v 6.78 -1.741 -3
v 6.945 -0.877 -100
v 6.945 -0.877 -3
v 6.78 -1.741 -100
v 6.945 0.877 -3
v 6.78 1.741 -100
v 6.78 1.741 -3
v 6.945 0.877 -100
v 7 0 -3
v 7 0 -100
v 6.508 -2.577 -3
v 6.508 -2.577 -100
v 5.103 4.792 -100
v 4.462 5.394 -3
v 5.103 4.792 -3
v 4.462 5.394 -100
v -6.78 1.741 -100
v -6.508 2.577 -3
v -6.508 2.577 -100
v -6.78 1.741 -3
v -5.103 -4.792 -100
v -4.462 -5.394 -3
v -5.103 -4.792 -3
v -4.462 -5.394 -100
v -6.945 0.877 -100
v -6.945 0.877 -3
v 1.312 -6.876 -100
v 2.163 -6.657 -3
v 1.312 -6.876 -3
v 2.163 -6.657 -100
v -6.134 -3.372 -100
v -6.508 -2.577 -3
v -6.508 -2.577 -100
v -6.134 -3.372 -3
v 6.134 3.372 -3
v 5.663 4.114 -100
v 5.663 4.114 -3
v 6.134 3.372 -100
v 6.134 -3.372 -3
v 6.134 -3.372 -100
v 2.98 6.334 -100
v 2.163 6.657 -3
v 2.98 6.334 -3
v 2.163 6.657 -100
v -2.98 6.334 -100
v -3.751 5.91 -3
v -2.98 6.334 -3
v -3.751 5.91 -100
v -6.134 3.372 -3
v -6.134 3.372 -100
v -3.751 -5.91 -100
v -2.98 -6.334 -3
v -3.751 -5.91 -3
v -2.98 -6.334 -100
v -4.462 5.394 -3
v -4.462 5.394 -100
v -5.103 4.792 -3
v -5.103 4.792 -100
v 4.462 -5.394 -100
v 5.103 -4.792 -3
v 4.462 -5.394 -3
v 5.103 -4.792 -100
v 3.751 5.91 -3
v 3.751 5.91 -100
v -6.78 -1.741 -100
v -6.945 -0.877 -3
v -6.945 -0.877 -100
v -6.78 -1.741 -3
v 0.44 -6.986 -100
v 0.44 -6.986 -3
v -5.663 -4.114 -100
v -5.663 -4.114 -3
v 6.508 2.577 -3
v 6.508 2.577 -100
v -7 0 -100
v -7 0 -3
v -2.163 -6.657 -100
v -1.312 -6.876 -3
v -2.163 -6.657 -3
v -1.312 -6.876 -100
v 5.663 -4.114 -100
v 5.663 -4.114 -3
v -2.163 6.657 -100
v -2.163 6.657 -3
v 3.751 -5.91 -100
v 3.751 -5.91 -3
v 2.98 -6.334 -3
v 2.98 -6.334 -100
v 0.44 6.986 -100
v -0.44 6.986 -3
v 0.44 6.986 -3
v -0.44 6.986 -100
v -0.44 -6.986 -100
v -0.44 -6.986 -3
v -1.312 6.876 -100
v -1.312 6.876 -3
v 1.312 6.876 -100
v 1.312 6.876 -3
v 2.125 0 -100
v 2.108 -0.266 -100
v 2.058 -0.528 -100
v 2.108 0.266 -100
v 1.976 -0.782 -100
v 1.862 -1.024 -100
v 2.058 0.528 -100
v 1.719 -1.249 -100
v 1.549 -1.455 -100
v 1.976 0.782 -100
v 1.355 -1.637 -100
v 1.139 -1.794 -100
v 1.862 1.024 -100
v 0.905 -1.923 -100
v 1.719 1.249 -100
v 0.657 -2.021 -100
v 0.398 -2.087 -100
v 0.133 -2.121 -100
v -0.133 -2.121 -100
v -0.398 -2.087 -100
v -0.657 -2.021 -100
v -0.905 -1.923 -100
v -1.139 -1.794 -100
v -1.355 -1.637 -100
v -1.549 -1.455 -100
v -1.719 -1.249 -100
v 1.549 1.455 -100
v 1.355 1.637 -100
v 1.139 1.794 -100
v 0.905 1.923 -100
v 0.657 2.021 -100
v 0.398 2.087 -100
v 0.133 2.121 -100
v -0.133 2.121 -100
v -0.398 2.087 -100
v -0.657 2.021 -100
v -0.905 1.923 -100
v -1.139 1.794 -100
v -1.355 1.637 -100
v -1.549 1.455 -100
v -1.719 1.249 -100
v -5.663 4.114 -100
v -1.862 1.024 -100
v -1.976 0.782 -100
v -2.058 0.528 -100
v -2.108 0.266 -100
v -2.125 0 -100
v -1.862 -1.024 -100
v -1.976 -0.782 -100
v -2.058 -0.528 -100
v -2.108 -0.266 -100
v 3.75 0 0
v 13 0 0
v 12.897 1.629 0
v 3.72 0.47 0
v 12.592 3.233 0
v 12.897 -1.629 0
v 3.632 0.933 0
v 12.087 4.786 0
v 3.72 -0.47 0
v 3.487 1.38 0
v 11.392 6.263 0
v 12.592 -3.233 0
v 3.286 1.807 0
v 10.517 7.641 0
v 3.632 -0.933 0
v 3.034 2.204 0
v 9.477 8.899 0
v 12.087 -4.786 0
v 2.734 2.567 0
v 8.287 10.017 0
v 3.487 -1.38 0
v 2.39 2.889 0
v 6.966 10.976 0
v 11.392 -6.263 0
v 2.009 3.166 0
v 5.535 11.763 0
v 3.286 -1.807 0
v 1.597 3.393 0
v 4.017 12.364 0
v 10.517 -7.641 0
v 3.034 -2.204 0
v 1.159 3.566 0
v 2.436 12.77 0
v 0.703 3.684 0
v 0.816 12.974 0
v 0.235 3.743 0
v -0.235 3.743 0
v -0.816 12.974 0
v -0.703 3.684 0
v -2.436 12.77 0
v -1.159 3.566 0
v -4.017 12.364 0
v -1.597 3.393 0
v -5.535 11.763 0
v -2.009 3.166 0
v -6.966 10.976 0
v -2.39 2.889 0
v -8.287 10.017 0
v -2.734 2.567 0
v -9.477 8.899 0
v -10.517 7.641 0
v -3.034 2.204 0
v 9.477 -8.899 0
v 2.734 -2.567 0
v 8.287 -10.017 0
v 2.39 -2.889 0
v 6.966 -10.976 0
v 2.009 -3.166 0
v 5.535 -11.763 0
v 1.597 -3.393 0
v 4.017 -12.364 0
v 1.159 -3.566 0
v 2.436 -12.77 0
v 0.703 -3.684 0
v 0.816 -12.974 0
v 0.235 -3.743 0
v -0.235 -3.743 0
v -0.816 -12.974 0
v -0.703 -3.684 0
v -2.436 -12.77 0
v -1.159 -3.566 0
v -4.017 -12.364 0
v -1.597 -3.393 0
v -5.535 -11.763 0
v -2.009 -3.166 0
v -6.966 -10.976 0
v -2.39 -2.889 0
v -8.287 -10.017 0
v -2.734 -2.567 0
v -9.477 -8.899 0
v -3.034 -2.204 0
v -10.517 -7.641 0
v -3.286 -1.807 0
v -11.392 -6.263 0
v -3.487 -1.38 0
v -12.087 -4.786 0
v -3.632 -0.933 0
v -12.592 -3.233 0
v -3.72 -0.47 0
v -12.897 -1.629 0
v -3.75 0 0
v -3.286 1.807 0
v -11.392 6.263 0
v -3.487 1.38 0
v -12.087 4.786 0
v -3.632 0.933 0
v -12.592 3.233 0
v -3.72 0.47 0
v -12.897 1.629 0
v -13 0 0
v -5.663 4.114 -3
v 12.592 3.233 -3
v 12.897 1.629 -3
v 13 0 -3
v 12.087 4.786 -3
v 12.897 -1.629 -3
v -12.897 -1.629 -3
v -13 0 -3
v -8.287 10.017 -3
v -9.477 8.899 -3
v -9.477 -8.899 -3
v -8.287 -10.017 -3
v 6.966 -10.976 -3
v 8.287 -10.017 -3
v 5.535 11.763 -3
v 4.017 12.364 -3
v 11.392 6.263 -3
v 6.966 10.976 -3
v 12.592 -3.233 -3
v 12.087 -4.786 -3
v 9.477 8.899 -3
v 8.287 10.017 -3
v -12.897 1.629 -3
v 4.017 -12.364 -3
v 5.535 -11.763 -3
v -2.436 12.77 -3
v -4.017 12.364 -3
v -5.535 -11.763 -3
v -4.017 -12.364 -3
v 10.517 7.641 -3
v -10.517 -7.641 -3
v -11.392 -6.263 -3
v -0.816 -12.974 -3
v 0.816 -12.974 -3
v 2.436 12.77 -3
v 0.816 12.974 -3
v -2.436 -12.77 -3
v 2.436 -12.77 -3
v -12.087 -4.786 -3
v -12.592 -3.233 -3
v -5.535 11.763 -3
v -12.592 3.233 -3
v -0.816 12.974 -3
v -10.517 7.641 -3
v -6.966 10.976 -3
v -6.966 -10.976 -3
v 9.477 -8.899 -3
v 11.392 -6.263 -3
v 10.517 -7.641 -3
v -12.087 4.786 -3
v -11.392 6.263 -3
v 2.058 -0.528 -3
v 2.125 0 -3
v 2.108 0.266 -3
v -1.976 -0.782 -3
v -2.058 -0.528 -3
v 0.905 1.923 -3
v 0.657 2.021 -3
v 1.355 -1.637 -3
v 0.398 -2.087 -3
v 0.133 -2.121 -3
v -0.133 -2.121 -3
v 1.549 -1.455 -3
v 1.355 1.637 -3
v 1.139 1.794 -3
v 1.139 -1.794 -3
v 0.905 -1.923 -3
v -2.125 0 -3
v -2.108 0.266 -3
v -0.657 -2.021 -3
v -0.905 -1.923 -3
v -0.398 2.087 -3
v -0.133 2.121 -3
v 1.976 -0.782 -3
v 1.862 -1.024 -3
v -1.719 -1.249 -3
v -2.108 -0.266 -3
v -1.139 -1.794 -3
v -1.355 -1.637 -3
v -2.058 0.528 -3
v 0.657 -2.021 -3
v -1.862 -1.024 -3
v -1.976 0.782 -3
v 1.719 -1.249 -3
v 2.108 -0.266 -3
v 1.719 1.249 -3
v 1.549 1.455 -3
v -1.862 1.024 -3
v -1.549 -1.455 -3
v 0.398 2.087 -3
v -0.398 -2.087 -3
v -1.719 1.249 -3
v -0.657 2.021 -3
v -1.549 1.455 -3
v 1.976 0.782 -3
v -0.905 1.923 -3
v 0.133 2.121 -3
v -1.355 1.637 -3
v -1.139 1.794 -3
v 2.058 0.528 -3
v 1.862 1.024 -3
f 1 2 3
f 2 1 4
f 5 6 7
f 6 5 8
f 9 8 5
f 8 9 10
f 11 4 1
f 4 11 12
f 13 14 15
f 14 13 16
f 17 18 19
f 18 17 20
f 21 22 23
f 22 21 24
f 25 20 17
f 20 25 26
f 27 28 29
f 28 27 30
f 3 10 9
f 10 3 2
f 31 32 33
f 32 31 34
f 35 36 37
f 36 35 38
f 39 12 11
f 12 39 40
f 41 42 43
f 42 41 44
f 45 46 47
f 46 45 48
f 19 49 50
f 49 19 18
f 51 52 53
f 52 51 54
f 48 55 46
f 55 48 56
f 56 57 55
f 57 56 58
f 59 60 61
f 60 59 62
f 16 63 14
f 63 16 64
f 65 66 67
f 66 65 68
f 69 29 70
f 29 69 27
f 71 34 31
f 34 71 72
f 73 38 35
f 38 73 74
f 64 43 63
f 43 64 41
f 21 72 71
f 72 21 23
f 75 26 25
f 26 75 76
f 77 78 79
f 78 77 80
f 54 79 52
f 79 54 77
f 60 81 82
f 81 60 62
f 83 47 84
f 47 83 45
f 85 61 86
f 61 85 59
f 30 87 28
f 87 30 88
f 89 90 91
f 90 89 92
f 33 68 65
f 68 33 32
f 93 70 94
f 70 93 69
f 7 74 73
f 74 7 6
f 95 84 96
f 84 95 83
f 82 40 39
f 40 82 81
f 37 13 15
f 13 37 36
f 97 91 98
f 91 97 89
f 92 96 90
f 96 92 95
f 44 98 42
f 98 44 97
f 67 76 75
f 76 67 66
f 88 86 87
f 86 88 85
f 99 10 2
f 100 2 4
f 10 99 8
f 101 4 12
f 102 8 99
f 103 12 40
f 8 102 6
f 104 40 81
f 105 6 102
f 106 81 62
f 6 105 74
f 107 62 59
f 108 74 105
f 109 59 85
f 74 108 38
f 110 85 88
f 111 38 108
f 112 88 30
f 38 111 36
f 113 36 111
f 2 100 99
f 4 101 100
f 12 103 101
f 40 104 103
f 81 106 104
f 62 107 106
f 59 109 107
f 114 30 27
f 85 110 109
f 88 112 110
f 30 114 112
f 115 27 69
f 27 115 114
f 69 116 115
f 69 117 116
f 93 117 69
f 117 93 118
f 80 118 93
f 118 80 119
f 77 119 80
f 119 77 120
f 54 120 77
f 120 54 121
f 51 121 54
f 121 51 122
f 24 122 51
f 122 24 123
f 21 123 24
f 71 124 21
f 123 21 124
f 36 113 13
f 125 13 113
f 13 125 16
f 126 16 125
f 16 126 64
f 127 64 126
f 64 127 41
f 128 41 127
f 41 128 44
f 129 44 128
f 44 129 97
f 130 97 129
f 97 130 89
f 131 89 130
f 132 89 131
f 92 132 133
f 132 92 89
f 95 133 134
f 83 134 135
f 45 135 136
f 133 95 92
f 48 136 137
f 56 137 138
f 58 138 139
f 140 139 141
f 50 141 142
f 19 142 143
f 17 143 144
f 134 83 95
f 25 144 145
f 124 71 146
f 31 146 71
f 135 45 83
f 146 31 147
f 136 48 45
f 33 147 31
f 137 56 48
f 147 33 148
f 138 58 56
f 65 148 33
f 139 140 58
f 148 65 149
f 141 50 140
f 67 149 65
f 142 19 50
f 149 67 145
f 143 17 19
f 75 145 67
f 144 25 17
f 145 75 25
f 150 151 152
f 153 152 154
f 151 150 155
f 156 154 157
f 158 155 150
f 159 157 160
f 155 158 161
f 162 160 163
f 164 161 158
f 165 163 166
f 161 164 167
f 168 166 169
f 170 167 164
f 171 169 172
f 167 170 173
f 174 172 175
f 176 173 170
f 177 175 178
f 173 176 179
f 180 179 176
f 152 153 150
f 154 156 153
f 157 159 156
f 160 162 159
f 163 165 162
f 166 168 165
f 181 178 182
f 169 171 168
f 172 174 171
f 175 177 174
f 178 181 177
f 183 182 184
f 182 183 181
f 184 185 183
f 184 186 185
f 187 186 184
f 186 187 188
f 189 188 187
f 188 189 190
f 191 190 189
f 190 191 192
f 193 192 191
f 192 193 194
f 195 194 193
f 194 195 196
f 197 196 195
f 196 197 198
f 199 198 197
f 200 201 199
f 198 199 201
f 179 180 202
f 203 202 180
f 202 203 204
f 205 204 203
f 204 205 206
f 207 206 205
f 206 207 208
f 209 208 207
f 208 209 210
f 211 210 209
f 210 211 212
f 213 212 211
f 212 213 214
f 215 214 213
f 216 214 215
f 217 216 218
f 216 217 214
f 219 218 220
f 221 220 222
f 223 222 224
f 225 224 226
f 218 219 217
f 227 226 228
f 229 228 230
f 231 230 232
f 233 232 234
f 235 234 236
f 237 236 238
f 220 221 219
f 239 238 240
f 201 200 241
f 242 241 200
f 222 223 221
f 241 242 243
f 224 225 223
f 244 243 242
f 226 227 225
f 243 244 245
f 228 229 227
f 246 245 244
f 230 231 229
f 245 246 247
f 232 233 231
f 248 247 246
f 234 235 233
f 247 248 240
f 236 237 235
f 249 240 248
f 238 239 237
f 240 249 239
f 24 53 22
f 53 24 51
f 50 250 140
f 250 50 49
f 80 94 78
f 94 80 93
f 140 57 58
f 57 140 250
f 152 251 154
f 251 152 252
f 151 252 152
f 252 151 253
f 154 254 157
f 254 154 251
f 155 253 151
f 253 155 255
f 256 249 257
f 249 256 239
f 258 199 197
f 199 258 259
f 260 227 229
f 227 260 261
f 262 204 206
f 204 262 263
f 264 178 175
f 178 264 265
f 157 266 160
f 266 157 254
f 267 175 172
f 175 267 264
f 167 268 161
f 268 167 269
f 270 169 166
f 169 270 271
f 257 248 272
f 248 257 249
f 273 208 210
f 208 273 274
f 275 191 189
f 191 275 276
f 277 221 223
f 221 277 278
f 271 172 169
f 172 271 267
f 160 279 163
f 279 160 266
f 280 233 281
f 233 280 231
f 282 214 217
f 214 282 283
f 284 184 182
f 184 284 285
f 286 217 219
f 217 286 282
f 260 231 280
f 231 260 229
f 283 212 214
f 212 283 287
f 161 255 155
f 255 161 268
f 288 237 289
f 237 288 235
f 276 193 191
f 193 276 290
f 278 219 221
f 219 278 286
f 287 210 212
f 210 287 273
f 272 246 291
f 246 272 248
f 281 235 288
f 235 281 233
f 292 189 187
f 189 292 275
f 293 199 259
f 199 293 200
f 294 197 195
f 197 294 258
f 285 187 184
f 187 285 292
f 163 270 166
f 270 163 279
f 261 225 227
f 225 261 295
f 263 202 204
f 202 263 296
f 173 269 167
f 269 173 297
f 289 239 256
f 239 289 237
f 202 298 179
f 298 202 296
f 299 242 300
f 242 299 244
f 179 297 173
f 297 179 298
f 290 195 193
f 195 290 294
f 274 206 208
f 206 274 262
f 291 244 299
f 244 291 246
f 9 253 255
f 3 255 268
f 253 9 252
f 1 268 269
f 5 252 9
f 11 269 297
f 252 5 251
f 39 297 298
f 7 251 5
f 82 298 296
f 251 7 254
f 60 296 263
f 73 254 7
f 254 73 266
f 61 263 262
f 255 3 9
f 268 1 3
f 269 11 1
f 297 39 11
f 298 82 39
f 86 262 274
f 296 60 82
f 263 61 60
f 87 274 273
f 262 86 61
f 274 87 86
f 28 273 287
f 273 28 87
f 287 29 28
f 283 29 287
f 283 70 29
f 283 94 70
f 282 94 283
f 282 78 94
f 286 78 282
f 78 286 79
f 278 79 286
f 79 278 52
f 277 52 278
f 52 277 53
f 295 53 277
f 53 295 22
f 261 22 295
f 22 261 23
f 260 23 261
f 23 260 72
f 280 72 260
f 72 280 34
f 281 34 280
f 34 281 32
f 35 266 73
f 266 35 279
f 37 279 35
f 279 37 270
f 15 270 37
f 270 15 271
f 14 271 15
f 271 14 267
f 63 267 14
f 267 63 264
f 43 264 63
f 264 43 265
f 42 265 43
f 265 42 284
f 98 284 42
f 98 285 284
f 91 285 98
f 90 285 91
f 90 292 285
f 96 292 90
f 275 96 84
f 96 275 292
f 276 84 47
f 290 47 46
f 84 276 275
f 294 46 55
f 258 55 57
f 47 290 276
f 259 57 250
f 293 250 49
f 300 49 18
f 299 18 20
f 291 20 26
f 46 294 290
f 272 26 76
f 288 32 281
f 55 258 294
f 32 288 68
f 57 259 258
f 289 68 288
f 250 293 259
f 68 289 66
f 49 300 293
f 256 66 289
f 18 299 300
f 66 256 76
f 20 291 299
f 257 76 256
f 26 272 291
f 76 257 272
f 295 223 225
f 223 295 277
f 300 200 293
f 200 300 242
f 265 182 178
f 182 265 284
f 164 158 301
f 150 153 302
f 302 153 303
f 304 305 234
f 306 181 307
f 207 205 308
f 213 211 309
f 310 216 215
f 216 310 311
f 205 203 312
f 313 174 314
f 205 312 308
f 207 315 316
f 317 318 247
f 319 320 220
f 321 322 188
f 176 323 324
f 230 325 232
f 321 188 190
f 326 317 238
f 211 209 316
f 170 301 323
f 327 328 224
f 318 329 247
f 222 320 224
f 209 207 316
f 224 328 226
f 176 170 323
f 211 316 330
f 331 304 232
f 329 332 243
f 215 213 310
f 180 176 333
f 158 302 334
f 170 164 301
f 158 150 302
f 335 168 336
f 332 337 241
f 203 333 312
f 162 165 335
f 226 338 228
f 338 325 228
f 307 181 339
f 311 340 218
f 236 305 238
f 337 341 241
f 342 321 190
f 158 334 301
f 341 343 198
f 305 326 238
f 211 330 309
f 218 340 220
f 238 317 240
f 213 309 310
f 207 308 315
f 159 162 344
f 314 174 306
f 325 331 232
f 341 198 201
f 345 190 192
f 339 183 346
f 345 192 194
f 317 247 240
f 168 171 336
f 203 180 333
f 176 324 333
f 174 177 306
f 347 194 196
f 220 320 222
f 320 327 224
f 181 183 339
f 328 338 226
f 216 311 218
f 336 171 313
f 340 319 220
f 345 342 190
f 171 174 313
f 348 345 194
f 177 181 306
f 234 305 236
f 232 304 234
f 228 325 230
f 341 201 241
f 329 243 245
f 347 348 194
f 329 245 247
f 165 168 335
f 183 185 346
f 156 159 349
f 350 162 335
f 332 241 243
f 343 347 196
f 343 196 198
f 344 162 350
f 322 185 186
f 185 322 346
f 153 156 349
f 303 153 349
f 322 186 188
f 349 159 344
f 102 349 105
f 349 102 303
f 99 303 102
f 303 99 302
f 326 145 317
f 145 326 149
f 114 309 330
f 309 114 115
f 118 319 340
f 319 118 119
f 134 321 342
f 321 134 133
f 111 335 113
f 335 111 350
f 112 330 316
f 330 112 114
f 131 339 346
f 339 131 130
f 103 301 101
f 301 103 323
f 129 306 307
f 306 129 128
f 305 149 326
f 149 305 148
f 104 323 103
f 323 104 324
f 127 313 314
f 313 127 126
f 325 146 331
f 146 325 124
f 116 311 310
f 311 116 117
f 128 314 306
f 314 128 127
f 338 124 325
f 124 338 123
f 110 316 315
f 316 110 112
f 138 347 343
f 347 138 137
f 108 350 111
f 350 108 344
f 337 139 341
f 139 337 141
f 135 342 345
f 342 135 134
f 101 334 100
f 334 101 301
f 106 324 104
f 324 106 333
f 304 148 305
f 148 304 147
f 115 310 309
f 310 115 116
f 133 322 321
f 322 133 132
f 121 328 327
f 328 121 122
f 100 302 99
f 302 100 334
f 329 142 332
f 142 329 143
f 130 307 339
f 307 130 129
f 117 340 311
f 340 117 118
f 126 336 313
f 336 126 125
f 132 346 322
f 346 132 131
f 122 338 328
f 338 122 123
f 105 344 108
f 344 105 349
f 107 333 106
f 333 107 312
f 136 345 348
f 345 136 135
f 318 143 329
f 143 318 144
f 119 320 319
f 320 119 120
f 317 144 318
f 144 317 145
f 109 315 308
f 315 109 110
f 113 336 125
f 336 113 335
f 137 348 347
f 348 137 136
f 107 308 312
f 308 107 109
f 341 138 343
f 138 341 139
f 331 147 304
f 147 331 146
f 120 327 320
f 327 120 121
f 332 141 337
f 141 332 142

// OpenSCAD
$fn = 50;


difference() {
	union() {
		translate(v = [0, 0, -100.0000000000]) {
			cylinder(h = 100, r = 7.0000000000);
		}
		translate(v = [0, 0, -3.0000000000]) {
			cylinder(h = 3, r = 13.0000000000);
		}
	}
	union() {
		translate(v = [0, 0, 0]) {
			rotate(a = [0, 0, 0]) {
				difference() {
					union() {
						#translate(v = [0, 0, -100.0000000000]) {
							cylinder(h = 100, r = 2.0000000000);
						}
						#translate(v = [0, 0, -3]) {
							cylinder(h = 3, r = 7.0000000000, r1 = 2.1250000000, r2 = 3.7500000000);
						}
						#translate(v = [0, 0, -100.0000000000]) {
							cylinder(h = 100, r = 2.1250000000);
						}
						#translate(v = [0, 0, -100.0000000000]) {
							cylinder(h = 100, r = 2.0000000000);
						}
					}
					union();
				}
			}
		}
	}
}
